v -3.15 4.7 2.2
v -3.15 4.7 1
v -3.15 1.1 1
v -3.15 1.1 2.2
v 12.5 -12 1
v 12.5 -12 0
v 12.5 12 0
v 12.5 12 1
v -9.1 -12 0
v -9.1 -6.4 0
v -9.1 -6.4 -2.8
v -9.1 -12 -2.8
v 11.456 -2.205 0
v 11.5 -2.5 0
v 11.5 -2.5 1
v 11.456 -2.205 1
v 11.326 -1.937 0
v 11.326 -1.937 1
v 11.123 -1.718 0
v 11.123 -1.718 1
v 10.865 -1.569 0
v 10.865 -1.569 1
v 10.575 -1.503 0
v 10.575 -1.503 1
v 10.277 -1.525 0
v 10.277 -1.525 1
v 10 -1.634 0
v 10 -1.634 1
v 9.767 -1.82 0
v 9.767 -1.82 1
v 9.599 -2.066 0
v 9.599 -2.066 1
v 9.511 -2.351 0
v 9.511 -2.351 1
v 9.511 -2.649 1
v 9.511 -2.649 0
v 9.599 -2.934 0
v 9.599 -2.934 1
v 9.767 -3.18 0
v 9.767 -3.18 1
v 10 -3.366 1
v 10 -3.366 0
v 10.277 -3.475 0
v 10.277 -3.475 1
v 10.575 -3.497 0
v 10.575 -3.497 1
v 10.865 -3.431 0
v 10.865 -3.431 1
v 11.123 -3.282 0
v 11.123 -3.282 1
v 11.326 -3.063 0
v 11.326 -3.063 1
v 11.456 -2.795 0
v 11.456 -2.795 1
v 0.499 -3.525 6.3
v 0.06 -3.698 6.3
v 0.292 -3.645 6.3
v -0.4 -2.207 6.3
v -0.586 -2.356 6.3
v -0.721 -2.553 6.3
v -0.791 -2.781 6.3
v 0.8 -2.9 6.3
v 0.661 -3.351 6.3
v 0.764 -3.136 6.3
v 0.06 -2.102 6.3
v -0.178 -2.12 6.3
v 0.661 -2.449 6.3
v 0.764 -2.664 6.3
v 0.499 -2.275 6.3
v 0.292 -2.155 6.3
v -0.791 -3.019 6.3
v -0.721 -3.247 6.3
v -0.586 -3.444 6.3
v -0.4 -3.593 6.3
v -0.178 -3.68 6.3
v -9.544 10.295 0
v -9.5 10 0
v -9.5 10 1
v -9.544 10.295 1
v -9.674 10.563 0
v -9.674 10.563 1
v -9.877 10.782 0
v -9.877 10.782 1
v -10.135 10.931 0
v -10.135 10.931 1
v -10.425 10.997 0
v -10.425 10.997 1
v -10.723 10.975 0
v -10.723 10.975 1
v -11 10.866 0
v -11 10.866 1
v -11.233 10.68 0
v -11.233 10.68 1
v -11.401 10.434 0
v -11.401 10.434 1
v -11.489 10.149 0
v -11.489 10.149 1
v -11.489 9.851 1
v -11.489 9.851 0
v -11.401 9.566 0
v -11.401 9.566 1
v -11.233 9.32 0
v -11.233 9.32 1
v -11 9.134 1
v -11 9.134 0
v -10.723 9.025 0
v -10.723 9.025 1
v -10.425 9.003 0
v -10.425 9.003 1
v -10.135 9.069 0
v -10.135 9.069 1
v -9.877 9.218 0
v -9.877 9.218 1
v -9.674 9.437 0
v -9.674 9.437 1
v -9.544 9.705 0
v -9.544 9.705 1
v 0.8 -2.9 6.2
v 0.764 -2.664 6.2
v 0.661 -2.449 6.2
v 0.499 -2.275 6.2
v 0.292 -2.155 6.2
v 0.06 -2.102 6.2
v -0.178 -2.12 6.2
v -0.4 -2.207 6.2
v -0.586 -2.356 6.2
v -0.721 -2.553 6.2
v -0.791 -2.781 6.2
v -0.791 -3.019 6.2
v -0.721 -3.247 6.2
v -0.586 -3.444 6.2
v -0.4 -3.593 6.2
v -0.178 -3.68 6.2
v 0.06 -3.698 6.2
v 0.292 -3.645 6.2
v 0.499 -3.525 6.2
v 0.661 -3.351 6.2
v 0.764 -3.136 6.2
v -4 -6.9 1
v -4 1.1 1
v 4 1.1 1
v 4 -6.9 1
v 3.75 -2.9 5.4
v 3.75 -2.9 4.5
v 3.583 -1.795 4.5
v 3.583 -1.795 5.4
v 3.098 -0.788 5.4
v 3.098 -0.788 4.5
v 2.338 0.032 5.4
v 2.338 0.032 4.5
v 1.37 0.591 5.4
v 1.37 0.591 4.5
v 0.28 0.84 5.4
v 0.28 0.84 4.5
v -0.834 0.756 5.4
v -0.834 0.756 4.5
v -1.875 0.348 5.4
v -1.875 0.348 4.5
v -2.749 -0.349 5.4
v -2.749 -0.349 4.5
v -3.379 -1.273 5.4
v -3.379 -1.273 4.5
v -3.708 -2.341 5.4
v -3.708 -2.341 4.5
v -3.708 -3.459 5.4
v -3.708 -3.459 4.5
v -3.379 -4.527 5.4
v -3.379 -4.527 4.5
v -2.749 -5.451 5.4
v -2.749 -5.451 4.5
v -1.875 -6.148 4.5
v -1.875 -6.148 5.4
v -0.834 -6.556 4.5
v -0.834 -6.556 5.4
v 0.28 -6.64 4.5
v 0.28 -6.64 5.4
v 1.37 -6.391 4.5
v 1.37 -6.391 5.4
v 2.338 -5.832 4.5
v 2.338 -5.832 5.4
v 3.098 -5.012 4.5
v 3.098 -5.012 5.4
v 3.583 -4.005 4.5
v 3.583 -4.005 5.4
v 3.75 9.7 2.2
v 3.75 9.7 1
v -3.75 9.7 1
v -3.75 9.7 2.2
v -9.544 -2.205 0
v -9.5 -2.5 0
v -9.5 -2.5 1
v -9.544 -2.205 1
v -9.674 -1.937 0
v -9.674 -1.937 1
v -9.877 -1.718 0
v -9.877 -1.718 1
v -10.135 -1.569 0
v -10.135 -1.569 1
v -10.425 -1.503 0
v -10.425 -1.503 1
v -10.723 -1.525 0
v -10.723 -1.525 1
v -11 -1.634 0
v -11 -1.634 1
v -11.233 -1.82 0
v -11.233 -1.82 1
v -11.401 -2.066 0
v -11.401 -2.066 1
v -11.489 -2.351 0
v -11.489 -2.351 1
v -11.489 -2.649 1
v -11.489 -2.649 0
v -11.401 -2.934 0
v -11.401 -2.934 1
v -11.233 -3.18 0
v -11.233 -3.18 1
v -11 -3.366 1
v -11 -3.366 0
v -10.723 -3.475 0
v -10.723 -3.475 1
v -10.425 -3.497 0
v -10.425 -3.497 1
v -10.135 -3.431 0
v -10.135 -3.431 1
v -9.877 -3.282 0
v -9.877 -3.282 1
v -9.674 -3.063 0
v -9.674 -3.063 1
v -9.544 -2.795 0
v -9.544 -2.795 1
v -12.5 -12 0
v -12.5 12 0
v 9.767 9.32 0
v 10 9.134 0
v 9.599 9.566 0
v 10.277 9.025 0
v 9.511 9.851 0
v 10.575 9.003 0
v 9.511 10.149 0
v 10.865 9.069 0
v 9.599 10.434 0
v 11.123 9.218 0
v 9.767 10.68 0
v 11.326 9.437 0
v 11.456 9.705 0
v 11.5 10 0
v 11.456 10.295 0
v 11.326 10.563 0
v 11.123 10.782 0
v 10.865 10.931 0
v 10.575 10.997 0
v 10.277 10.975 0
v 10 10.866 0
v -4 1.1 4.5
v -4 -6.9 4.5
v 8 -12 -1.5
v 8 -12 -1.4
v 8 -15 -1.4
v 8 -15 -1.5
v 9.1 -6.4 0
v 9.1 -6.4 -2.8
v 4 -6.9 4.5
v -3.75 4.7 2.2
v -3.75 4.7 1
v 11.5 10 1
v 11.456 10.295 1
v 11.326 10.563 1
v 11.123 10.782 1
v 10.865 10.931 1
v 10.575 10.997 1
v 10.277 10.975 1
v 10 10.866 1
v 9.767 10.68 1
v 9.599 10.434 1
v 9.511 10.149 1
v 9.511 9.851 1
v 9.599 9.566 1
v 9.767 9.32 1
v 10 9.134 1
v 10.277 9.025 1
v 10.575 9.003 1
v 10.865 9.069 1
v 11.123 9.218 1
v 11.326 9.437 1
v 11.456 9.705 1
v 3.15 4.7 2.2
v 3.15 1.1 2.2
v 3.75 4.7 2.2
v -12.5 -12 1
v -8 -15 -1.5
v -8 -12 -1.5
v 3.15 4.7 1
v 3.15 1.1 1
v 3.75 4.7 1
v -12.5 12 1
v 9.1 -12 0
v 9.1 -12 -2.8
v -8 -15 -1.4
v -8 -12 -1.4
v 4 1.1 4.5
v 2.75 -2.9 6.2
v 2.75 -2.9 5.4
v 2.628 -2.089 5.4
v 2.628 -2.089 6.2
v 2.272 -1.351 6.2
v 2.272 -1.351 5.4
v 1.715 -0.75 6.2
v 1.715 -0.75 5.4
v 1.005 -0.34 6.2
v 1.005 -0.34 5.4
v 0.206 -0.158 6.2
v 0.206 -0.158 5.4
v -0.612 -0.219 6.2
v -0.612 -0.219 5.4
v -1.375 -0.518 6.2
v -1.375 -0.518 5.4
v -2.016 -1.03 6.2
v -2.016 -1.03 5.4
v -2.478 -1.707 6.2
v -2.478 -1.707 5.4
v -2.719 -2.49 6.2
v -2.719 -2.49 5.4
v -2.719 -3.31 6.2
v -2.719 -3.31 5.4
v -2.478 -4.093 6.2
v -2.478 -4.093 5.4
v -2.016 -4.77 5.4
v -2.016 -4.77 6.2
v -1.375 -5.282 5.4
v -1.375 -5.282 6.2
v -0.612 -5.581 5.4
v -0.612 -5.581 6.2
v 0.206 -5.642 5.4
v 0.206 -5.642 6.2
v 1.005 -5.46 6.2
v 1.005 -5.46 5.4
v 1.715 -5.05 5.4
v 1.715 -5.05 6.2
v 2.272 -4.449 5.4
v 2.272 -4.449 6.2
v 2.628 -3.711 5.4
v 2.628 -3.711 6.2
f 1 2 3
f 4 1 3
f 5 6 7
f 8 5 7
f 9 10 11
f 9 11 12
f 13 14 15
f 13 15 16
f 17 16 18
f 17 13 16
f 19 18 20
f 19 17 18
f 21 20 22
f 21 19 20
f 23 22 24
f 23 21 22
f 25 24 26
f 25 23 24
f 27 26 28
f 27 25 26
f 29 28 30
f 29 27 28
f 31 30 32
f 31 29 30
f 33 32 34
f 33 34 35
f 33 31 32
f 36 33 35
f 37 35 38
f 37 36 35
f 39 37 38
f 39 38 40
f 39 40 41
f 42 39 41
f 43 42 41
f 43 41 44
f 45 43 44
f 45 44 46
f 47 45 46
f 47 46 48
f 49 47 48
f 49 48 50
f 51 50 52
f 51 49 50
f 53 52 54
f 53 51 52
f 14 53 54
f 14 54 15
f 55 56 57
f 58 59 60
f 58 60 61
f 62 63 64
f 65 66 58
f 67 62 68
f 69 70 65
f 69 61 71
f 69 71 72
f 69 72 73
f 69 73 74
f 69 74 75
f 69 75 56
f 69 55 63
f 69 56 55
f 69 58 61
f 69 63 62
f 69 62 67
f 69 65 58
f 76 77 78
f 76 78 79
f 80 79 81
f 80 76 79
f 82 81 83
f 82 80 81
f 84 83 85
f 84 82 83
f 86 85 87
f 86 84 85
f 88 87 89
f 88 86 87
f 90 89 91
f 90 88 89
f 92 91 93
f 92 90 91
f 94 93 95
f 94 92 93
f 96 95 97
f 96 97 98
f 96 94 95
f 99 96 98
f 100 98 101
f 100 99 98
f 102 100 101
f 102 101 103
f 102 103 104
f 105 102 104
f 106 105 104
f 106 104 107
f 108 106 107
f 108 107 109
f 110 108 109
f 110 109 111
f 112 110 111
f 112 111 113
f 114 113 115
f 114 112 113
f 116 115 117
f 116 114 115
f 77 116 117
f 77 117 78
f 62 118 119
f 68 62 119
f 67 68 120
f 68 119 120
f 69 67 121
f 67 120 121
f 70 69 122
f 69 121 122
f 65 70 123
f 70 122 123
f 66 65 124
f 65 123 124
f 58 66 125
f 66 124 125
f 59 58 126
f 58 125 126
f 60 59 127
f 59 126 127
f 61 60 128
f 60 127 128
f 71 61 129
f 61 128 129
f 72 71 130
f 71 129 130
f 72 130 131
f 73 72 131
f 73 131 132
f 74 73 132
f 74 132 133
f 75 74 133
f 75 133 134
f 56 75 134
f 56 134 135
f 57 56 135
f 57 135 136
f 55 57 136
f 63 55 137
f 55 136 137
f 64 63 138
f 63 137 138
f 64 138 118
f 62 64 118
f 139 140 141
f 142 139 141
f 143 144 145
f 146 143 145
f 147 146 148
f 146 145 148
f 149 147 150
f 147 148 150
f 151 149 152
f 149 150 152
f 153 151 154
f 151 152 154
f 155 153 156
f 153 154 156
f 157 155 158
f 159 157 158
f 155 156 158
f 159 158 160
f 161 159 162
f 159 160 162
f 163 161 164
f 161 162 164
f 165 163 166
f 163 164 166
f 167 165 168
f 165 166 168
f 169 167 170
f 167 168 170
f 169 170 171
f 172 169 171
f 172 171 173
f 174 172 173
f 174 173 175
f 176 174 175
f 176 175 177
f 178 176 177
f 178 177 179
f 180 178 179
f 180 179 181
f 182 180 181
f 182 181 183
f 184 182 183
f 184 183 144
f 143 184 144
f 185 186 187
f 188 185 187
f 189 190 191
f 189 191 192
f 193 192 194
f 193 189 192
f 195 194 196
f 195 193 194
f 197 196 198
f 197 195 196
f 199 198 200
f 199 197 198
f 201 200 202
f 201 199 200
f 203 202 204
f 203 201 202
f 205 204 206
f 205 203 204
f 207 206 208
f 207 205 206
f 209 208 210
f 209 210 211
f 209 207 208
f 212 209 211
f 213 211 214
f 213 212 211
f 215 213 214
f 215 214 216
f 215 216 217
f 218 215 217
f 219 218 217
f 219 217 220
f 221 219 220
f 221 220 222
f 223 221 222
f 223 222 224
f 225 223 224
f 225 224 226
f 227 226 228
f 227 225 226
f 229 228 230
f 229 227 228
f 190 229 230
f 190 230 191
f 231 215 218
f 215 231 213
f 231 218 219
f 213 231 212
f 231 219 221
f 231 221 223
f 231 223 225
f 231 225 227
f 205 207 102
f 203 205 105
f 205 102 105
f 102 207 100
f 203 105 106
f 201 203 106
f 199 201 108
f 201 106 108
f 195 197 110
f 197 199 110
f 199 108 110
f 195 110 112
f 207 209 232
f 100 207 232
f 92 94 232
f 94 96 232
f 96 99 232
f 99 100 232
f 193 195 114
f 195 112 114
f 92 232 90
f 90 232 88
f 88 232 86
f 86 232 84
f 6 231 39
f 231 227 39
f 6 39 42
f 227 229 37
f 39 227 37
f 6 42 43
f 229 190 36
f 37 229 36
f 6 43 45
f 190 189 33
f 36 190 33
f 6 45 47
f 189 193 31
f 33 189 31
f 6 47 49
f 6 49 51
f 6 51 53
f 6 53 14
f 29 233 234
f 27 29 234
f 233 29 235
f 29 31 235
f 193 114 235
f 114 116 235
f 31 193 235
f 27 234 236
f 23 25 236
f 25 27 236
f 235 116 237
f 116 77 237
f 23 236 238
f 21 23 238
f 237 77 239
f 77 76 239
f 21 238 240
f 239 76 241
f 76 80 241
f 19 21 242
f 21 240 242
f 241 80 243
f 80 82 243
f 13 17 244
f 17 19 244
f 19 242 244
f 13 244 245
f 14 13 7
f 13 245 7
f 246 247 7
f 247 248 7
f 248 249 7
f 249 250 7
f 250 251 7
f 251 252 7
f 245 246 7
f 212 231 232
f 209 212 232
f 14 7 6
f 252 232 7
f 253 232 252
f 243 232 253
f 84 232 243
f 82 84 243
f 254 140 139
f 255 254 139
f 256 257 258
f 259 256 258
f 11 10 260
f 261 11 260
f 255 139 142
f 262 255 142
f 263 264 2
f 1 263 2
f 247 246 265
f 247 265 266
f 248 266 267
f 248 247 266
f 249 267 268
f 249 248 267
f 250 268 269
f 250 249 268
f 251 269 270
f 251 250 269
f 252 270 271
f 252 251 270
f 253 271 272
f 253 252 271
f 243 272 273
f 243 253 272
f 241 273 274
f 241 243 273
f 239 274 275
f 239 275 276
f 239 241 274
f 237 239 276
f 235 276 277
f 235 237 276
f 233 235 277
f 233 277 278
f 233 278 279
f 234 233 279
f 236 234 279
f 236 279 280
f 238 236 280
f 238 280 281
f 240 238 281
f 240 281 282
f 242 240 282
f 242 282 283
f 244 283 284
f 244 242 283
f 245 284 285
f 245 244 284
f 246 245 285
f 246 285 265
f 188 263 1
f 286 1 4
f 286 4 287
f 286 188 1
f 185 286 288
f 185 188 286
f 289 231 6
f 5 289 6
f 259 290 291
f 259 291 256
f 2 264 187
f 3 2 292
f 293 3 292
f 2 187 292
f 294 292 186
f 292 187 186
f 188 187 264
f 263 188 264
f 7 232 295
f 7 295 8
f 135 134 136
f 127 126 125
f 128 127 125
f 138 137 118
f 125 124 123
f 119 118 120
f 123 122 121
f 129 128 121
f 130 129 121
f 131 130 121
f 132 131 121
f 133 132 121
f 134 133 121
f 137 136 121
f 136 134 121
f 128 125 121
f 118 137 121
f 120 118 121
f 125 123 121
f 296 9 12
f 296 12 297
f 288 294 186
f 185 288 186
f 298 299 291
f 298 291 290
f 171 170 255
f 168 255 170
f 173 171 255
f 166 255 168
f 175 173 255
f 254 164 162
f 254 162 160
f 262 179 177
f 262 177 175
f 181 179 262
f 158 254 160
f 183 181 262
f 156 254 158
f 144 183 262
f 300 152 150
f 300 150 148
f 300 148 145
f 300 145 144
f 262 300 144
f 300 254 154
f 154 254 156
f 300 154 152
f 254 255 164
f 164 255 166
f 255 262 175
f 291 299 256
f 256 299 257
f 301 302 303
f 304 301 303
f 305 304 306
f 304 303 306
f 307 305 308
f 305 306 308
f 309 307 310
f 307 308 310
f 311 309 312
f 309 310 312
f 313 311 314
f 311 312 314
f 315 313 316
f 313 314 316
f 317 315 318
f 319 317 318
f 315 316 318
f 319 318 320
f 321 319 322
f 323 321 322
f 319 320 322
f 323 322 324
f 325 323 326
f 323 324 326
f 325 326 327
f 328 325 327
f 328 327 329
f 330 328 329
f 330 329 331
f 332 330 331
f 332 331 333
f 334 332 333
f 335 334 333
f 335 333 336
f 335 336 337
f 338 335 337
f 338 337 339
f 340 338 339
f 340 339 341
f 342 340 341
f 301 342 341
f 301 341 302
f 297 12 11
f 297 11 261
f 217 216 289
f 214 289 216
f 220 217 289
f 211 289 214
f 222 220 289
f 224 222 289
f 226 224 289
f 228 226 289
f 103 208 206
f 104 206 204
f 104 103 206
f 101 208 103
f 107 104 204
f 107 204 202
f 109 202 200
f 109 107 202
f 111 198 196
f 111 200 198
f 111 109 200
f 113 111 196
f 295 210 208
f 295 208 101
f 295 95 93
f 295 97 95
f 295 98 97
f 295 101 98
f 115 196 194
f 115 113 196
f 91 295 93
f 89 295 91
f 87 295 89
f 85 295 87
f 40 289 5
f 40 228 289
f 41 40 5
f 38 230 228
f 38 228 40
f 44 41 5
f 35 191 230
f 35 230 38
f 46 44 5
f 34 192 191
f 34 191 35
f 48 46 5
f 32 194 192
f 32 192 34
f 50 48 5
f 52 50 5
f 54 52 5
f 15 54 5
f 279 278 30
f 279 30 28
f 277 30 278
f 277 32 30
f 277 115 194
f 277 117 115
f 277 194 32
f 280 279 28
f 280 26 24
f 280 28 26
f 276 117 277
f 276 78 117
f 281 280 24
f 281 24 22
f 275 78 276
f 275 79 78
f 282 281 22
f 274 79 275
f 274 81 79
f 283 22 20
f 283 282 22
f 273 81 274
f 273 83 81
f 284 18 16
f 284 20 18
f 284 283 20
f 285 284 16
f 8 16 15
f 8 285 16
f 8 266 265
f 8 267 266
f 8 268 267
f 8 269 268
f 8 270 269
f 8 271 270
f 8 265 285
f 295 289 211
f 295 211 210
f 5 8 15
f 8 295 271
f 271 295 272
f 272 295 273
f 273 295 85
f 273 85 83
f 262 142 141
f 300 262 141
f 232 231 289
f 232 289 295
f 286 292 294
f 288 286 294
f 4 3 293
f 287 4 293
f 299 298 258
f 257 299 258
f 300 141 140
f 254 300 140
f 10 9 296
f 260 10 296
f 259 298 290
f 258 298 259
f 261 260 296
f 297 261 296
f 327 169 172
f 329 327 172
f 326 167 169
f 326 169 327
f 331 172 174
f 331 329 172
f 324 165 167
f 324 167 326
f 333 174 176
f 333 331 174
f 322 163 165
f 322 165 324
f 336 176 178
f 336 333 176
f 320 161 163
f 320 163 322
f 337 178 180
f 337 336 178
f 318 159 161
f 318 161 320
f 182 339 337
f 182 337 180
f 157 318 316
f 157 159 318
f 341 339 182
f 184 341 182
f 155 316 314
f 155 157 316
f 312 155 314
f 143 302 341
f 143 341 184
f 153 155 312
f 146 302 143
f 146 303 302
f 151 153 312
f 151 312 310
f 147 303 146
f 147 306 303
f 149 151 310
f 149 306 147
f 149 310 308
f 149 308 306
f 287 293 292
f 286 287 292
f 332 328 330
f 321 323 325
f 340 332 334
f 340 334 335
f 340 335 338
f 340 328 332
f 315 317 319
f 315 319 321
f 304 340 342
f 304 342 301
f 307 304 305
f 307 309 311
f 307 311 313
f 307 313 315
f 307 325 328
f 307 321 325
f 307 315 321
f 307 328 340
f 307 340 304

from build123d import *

# Parameters (mm, degrees)
F0_W      = 25
F0_H      = 24
F0_R      = 1
F1_DEPTH  = 1
F2_R      = 3.75
F2_R_2    = 2.75
F3_DEPTH  = 3.5
F4_DEPTH  = 4.4
F5_DEPTH  = 5.2
F6_R      = 0.8
F7_DEPTH  = 0.1
F8_W      = 18.2
F8_H      = 5.6
F9_DEPTH  = 2.8
F11_DEPTH = 1.2
F13_W     = 16
F13_H     = 3
F14_DEPTH = 0.1


with BuildPart() as f1:
    # F0 (on Top) → F1 (new body)
    with BuildSketch(Plane.XY):
        Rectangle(F0_W, F0_H)
        with Locations((-10.5, -2.5)):
            Circle(F0_R, mode=Mode.SUBTRACT)
        with Locations((10.5, -2.5)):
            Circle(F0_R, mode=Mode.SUBTRACT)
        with Locations((-10.5, 10)):
            Circle(F0_R, mode=Mode.SUBTRACT)
        with Locations((10.5, 10)):
            Circle(F0_R, mode=Mode.SUBTRACT)
    extrude(amount=F1_DEPTH)


with BuildPart() as f3:
    # F2 (on face) → F3 (new body)
    with BuildSketch(Plane.XY.offset(1)):
        Polygon((4, -6.9), (4, 1.1), (3.4, 1.1), (-3.4, 1.1), (-4, 1.1), (-4, -6.9), align=None)
        with Locations((0, -2.9)):
            Circle(F2_R, mode=Mode.SUBTRACT)
        with Locations((0, -2.9)):
            Circle(F2_R)
        with Locations((0, -2.9)):
            Circle(F2_R_2, mode=Mode.SUBTRACT)
        with Locations((0, -2.9)):
            Circle(F2_R_2)
    extrude(amount=F3_DEPTH)

    # F2 (on face) → F4 (join)
    with BuildSketch(Plane.XY.offset(1)):
        with Locations((0, -2.9)):
            Circle(F2_R)
        with Locations((0, -2.9)):
            Circle(F2_R_2, mode=Mode.SUBTRACT)
        with Locations((0, -2.9)):
            Circle(F2_R_2)
    extrude(amount=F4_DEPTH)

    # F2 (on face) → F5 (join)
    with BuildSketch(Plane.XY.offset(1)):
        with Locations((0, -2.9)):
            Circle(F2_R_2)
    extrude(amount=F5_DEPTH)


with BuildPart() as f7:
    # F6 (on face) → F7 (new body)
    with BuildSketch(Plane.XY.offset(6.2)):
        with Locations((0, -2.9)):
            Circle(F6_R)
    extrude(amount=F7_DEPTH)


with BuildPart() as f9:
    # F8 (on face) → F9 (new body)
    with BuildSketch(Plane(origin=(0, 0, 0), x_dir=(1, 0, 0), z_dir=(0, 0, -1))):
        with Locations((0, 9.2)):
            Rectangle(F8_W, F8_H)
    extrude(amount=F9_DEPTH)


with BuildPart() as f11:
    # F10 (on face) → F11 (new body)
    with BuildSketch(Plane.XY.offset(1)):
        Polygon((-3.15, 4.7), (-3.15, 1.1), (3.15, 1.1), (3.15, 4.7), (3.75, 4.7), (3.75, 9.7), (-3.75, 9.7), (-3.75, 4.7), align=None)
    extrude(amount=F11_DEPTH)


with BuildPart() as f14:
    # F13 (on offset) → F14 (new body)
    with BuildSketch(Plane(origin=(0, 0, -1.4), x_dir=(1, 0, 0), z_dir=(0, 0, -1))):
        with Locations((0, 13.5)):
            Rectangle(F13_W, F13_H)
    extrude(amount=F14_DEPTH)


solid = Compound([f1.part, f3.part, f7.part, f9.part, f11.part, f14.part])
